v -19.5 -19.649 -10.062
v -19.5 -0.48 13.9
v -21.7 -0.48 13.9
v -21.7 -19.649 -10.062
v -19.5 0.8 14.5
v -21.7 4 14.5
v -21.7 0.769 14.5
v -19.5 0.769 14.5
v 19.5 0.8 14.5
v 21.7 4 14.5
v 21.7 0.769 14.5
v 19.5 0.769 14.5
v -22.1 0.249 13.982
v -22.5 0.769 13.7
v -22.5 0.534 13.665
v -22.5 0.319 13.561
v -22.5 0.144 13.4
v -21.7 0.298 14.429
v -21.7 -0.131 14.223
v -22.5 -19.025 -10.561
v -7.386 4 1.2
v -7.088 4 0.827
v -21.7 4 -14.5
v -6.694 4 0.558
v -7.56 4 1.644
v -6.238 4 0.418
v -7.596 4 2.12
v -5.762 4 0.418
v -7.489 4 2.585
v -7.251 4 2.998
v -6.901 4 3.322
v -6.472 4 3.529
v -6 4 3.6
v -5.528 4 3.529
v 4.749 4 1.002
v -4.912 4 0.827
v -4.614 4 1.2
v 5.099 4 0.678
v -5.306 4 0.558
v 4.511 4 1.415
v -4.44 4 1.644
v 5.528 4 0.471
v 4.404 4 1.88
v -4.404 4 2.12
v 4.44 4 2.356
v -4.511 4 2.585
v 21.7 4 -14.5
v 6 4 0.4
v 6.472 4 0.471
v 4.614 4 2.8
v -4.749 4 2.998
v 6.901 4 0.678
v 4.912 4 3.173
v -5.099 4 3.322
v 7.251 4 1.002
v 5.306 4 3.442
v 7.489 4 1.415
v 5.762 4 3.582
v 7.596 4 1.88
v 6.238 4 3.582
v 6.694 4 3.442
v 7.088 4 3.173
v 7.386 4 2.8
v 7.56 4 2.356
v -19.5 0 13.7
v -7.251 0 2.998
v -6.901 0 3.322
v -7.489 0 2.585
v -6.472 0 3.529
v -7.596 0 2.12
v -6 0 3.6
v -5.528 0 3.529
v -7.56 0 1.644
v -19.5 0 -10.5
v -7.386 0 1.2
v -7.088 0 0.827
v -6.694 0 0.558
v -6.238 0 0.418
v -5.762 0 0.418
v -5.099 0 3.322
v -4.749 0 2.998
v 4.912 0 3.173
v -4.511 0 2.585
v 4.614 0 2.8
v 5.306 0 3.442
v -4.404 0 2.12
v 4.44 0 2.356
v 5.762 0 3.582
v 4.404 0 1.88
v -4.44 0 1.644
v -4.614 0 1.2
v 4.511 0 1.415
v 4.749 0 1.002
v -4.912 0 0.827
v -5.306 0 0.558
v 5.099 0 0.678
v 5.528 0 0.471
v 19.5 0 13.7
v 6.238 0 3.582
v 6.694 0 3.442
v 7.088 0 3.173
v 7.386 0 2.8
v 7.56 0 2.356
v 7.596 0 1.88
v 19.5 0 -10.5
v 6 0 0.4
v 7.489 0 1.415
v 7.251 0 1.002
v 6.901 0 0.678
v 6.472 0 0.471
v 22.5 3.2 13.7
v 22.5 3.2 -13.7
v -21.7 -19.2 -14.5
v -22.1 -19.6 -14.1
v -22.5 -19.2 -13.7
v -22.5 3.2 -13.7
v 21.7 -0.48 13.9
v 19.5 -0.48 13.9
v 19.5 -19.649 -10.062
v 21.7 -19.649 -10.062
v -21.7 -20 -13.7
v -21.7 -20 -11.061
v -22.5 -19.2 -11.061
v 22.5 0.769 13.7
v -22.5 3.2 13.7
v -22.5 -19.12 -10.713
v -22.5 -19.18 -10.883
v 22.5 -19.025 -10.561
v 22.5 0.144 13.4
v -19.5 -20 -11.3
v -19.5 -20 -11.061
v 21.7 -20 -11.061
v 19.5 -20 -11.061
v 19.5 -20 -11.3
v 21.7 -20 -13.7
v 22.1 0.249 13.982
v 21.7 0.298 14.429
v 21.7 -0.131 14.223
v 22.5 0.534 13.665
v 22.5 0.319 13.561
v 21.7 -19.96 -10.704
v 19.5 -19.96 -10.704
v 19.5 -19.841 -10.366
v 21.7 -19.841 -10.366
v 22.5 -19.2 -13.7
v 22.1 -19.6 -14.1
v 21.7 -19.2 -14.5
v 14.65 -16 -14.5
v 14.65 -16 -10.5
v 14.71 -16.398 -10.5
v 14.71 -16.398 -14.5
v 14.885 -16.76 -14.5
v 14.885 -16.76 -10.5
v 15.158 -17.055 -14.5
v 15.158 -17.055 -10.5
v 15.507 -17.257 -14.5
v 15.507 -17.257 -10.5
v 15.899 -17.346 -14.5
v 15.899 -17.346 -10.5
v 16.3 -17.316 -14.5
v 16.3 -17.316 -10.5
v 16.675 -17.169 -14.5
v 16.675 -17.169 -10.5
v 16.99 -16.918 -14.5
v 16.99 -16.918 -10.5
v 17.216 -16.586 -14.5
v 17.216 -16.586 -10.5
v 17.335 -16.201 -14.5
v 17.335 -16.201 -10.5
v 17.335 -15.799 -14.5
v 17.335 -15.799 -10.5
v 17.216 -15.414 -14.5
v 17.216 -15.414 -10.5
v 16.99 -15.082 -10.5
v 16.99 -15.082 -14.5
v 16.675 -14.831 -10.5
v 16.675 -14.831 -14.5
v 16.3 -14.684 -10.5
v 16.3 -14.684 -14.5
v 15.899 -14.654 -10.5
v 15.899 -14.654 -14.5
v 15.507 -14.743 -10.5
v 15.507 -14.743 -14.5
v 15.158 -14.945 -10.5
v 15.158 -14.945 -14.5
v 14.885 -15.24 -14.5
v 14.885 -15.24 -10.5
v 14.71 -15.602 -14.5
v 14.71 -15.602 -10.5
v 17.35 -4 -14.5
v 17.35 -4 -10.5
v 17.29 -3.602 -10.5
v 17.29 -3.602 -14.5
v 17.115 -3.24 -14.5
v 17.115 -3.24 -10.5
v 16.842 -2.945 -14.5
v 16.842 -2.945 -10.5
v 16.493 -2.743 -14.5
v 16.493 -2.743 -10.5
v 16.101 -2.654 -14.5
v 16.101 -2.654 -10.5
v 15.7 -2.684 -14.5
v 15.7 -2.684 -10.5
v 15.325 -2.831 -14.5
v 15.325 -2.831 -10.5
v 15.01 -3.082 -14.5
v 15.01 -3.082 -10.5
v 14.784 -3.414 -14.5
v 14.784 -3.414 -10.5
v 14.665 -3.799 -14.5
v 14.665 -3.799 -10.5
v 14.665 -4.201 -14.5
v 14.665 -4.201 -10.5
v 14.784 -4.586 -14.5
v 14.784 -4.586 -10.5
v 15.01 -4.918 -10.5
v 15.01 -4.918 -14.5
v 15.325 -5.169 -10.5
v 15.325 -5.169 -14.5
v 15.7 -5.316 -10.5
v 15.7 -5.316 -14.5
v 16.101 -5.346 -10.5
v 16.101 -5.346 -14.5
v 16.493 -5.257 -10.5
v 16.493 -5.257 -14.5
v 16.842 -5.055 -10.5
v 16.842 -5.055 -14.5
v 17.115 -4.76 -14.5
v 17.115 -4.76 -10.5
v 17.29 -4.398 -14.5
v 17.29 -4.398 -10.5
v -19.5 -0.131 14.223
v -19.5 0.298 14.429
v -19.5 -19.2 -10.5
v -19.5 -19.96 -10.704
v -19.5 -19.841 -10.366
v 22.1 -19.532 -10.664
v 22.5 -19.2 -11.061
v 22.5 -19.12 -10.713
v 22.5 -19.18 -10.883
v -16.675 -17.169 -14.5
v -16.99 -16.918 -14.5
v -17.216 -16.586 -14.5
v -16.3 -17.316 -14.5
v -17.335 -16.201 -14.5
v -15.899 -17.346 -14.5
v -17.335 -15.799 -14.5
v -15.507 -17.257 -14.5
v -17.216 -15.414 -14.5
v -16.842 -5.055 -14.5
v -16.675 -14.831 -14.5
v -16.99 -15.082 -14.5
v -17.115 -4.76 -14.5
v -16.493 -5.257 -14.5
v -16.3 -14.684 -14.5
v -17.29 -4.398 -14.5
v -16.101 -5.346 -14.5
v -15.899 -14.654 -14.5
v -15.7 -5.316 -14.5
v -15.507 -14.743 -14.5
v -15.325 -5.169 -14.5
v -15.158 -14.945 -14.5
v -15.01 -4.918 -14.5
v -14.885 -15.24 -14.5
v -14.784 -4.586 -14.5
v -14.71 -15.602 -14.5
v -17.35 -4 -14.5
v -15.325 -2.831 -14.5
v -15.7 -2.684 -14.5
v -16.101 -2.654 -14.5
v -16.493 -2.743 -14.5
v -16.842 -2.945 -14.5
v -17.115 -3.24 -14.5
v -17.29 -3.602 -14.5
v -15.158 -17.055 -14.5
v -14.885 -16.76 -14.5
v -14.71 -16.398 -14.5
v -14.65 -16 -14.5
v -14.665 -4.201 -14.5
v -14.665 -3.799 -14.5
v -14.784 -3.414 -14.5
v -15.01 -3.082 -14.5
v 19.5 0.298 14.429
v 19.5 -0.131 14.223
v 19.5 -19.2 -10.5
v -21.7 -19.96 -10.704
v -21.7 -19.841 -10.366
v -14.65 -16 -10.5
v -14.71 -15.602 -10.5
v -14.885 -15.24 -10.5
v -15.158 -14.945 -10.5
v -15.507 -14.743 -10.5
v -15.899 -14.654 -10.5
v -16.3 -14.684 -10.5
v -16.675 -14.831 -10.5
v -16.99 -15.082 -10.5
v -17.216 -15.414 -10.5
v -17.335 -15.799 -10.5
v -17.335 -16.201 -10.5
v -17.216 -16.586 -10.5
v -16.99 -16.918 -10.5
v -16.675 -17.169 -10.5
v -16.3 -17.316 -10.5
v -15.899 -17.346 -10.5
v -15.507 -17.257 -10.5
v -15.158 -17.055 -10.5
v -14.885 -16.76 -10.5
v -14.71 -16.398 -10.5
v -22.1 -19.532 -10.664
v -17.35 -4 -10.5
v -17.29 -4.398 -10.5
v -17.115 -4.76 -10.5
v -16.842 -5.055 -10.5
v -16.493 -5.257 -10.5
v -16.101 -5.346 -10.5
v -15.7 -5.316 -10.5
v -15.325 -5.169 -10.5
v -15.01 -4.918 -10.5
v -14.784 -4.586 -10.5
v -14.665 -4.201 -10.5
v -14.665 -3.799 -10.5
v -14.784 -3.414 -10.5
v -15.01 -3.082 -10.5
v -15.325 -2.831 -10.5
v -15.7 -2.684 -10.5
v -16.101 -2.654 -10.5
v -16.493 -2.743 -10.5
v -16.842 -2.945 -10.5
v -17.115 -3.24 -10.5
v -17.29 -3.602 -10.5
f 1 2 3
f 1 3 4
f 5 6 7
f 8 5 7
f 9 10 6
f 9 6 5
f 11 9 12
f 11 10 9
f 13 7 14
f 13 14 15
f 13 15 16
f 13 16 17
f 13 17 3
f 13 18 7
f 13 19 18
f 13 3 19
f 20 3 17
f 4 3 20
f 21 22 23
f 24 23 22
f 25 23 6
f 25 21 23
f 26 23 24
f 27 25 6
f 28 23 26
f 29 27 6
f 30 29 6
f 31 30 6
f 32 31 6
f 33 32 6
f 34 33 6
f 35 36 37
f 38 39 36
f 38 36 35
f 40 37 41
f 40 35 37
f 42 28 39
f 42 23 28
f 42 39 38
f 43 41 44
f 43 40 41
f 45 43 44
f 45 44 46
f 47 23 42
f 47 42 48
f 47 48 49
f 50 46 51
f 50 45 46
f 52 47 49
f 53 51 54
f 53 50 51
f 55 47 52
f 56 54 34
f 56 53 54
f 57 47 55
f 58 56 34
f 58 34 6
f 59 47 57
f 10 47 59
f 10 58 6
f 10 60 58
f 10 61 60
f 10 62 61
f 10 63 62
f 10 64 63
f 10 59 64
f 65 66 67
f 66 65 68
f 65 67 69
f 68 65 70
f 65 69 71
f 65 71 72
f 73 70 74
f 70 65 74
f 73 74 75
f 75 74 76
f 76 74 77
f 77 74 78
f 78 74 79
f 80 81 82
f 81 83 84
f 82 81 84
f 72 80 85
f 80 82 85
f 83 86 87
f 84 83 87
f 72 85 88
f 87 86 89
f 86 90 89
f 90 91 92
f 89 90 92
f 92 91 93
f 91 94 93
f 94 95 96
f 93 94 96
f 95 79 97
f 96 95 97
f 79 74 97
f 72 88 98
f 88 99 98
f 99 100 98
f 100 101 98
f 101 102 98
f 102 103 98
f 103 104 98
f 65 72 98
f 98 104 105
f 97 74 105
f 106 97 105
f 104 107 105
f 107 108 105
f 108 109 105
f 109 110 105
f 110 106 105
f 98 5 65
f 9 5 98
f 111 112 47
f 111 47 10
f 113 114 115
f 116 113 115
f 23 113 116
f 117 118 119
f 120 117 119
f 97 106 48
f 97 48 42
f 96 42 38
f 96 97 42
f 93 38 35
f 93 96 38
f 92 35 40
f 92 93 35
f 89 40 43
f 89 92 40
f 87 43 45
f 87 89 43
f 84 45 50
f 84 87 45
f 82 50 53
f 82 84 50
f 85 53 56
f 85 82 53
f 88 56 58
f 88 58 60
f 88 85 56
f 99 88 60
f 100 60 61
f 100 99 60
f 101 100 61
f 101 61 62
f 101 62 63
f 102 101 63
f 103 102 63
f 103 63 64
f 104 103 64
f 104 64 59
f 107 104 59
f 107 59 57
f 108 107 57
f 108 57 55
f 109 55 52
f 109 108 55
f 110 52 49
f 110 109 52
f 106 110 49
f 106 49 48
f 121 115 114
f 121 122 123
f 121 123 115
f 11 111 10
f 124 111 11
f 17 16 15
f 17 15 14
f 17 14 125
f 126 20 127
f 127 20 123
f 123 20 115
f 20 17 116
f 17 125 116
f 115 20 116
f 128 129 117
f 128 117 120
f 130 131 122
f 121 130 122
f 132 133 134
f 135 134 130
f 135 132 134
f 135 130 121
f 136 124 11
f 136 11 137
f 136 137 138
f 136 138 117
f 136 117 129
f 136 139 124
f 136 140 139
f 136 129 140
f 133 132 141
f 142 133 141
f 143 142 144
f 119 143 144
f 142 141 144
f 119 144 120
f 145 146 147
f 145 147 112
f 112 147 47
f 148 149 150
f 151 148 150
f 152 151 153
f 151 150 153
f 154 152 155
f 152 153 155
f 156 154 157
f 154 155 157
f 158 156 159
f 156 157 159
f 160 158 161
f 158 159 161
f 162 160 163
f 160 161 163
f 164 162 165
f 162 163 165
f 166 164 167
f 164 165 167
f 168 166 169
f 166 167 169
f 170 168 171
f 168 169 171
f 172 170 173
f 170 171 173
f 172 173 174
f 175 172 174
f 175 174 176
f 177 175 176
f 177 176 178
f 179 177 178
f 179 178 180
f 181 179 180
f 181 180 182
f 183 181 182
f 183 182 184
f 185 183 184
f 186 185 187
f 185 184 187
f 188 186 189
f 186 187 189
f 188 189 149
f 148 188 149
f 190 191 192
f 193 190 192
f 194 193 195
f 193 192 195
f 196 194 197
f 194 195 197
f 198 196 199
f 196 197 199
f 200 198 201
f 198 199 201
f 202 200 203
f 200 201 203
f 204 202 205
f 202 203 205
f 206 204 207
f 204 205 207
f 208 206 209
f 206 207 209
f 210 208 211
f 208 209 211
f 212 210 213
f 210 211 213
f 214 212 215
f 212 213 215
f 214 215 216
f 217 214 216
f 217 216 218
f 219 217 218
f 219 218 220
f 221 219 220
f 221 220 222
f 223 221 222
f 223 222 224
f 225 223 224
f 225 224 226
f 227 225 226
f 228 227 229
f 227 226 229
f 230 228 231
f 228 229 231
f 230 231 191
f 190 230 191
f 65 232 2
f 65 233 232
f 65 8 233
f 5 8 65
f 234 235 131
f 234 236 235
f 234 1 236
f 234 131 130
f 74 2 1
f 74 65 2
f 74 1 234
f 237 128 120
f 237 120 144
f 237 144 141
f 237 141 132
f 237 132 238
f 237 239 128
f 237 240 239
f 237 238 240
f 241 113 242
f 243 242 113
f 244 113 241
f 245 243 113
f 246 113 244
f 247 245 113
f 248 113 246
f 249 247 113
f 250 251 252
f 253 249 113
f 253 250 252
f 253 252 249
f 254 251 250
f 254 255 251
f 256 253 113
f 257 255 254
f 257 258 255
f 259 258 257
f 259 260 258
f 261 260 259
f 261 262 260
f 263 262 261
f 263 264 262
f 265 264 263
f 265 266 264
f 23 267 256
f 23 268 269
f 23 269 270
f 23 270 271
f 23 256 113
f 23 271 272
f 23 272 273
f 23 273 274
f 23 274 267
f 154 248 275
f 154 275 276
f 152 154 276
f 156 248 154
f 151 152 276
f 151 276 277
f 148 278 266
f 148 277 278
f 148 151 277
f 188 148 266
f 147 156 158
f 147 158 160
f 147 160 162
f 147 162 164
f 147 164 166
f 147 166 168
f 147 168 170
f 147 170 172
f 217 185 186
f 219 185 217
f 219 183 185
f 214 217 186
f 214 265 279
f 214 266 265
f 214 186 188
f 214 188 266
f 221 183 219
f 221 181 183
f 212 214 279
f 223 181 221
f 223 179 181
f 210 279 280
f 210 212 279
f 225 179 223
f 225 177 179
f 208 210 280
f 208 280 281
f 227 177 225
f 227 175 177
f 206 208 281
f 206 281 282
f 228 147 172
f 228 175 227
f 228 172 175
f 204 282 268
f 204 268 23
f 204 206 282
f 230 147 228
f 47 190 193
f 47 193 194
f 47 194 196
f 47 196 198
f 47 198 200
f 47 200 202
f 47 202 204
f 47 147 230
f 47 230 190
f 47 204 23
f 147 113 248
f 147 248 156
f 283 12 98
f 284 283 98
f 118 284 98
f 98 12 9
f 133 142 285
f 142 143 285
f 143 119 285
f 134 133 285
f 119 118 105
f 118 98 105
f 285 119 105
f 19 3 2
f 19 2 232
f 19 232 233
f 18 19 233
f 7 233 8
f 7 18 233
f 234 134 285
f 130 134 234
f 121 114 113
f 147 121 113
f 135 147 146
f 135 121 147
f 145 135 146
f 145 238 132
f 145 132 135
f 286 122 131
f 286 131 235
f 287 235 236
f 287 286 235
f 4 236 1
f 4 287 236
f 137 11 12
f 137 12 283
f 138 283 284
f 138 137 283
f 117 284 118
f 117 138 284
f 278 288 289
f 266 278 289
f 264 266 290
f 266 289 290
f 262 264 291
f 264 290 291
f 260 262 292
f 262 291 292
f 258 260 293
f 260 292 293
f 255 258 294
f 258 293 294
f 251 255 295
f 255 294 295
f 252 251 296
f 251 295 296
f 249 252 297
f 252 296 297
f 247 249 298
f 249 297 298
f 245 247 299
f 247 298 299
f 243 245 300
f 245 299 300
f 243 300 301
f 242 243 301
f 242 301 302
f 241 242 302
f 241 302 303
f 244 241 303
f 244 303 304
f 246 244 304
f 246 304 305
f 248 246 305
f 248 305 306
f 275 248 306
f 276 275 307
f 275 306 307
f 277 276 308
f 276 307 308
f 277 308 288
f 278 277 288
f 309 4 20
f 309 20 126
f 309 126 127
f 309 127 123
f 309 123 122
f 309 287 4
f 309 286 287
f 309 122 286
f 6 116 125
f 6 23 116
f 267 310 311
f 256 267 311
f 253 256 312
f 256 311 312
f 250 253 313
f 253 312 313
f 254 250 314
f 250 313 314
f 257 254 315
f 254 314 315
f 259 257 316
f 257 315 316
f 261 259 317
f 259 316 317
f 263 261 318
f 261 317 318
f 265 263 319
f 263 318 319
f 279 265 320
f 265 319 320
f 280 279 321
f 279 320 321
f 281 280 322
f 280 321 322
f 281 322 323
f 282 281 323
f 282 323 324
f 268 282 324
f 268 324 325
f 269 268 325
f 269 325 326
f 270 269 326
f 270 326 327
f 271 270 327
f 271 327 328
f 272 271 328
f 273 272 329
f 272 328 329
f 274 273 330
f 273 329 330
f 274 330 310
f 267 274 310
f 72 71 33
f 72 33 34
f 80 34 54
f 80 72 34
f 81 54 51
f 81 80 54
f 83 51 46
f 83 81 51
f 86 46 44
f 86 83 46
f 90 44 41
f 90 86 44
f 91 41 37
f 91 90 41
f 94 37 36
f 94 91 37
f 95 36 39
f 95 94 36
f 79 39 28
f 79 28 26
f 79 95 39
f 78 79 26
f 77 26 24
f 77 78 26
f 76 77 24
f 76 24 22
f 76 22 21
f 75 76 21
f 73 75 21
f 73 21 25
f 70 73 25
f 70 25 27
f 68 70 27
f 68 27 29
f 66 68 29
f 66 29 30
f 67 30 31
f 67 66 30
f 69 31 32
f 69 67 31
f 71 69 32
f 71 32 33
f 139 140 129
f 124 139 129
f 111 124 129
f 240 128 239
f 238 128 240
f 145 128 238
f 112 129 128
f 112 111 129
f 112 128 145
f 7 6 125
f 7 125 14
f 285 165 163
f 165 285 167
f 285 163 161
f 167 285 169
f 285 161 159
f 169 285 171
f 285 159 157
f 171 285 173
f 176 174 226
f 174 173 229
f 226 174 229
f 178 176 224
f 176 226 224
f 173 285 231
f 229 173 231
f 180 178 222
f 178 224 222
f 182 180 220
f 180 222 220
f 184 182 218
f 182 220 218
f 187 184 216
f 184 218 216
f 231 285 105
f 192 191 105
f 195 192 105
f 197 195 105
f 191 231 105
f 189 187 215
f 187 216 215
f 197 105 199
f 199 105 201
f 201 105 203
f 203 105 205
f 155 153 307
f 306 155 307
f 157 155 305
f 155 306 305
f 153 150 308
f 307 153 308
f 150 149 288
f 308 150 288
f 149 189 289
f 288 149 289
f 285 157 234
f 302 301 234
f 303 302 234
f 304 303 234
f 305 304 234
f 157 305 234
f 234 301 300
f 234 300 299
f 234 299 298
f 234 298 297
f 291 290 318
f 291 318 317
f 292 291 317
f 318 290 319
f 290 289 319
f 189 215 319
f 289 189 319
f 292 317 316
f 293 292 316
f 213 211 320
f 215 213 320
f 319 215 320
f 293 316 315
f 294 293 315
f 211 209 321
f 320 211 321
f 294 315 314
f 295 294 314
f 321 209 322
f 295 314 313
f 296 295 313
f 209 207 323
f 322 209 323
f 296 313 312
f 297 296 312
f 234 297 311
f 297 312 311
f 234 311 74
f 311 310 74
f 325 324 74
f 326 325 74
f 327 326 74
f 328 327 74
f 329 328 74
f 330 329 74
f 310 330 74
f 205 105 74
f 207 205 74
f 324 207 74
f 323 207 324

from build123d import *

# Parameters (mm, degrees)
SKETCH_1_W          = 39
SKETCH_1_H          = 29
SKETCH_1_R          = 1.6
EXTRUDE_1_DEPTH     = 4
SKETCH_2_W          = 39
SKETCH_2_H          = 4
EXTRUDE_2_DEPTH     = 20
SKETCH_3_R          = 1.35
CUT_EXTRUDE_1_DEPTH = 4
EXTRUDE_3_DEPTH     = 3
CHAMFER_1_SIZE      = 0.8
FILLET_1_R          = 1.6
CHAMFER_3_SIZE      = 0.8


with BuildPart() as part:
    # 草图1 → 凸台-拉伸1 (new body)
    with BuildSketch(Plane(origin=(0, 0, 0), x_dir=(1, 0, 0), z_dir=(0, 1, 0))):
        Rectangle(SKETCH_1_W, SKETCH_1_H)
        with Locations(Location((-6, -2, 0), (0, 0, 270))):
            Circle(SKETCH_1_R, mode=Mode.SUBTRACT)
        with Locations(Location((6, -2, 0), (0, 0, 90))):
            Circle(SKETCH_1_R, mode=Mode.SUBTRACT)
    extrude(amount=EXTRUDE_1_DEPTH)

    # 草图2 → 凸台-拉伸2 (add)
    with BuildSketch(Plane(origin=(0, 0, 0), x_dir=(-1, 0, 0), z_dir=(0, -1, 0))):
        with Locations((0, 12.5)):
            Rectangle(SKETCH_2_W, SKETCH_2_H)
    extrude(amount=EXTRUDE_2_DEPTH)

    # 草图3 → 切除-拉伸1 (cut)
    with BuildSketch(Plane.XY.offset(-10.5)):
        with Locations((16, -4)):
            Circle(SKETCH_3_R)
        with Locations(Location((16, -16, 0), (0, 0, 180))):
            Circle(SKETCH_3_R)
        with Locations((-16, -16)):
            Circle(SKETCH_3_R)
        with Locations(Location((-16, -4, 0), (0, 0, 180))):
            Circle(SKETCH_3_R)
    extrude(amount=-CUT_EXTRUDE_1_DEPTH, mode=Mode.SUBTRACT)

    # 草图4 → 凸台-拉伸3 (add)
    with BuildSketch(Plane(origin=(19.5, 0, 0), x_dir=(0, 0, -1), z_dir=(1, 0, 0))):
        Polygon((-14.5, 0), (10.5, -20), (14.5, -20), (14.5, 4), (-14.5, 4), align=None)
    extrude_3 = extrude(amount=EXTRUDE_3_DEPTH)

    # 镜向1: 凸台-拉伸3 across plane
    add(extrude_3.mirror(Plane(origin=(0, 0, 0), x_dir=(0, 0, 1), z_dir=(1, 0, 0))))

    # 倒角1
    chamfer_1_edges = [part.edges().sort_by_distance(p)[0] for p in [
        (0, -20, -10.5),
        (0, -20, -14.5),
        (0, 0, 14.5),
        (22.5, -8, -14.5),
        (22.5, 4, 0),
        (-22.5, 4, 0),
        (-22.5, -8, -14.5),
    ]]
    chamfer(chamfer_1_edges, length=CHAMFER_1_SIZE)

    # 圆角1
    fillet_1_edges = [part.edges().sort_by_distance(p)[0] for p in [
        (21, 0, 14.5),
        (21, -20, -10.5),
        (-21, 0, 14.5),
        (-21, -20, -10.5),
    ]]
    fillet(fillet_1_edges, radius=FILLET_1_R)

    # 倒角3
    chamfer_3_edges = [part.edges().sort_by_distance(p)[0] for p in [
        (22.5, 1.984499878, 14.5),
        (22.5, -20, -12.380624847),
        (22.5, 0.075897787, 14.342085178),
        (22.5, -19.909805311, -10.531638589),
        (22.5, -10.064890217, 1.918887229),
        (-22.5, -20, -12.380624847),
        (-22.5, -19.909805311, -10.531638589),
        (-22.5, -10.064890217, 1.918887229),
        (-22.5, 0.075897787, 14.342085178),
        (-22.5, 1.984499878, 14.5),
    ]]
    chamfer(chamfer_3_edges, length=CHAMFER_3_SIZE)


solid = part.part
